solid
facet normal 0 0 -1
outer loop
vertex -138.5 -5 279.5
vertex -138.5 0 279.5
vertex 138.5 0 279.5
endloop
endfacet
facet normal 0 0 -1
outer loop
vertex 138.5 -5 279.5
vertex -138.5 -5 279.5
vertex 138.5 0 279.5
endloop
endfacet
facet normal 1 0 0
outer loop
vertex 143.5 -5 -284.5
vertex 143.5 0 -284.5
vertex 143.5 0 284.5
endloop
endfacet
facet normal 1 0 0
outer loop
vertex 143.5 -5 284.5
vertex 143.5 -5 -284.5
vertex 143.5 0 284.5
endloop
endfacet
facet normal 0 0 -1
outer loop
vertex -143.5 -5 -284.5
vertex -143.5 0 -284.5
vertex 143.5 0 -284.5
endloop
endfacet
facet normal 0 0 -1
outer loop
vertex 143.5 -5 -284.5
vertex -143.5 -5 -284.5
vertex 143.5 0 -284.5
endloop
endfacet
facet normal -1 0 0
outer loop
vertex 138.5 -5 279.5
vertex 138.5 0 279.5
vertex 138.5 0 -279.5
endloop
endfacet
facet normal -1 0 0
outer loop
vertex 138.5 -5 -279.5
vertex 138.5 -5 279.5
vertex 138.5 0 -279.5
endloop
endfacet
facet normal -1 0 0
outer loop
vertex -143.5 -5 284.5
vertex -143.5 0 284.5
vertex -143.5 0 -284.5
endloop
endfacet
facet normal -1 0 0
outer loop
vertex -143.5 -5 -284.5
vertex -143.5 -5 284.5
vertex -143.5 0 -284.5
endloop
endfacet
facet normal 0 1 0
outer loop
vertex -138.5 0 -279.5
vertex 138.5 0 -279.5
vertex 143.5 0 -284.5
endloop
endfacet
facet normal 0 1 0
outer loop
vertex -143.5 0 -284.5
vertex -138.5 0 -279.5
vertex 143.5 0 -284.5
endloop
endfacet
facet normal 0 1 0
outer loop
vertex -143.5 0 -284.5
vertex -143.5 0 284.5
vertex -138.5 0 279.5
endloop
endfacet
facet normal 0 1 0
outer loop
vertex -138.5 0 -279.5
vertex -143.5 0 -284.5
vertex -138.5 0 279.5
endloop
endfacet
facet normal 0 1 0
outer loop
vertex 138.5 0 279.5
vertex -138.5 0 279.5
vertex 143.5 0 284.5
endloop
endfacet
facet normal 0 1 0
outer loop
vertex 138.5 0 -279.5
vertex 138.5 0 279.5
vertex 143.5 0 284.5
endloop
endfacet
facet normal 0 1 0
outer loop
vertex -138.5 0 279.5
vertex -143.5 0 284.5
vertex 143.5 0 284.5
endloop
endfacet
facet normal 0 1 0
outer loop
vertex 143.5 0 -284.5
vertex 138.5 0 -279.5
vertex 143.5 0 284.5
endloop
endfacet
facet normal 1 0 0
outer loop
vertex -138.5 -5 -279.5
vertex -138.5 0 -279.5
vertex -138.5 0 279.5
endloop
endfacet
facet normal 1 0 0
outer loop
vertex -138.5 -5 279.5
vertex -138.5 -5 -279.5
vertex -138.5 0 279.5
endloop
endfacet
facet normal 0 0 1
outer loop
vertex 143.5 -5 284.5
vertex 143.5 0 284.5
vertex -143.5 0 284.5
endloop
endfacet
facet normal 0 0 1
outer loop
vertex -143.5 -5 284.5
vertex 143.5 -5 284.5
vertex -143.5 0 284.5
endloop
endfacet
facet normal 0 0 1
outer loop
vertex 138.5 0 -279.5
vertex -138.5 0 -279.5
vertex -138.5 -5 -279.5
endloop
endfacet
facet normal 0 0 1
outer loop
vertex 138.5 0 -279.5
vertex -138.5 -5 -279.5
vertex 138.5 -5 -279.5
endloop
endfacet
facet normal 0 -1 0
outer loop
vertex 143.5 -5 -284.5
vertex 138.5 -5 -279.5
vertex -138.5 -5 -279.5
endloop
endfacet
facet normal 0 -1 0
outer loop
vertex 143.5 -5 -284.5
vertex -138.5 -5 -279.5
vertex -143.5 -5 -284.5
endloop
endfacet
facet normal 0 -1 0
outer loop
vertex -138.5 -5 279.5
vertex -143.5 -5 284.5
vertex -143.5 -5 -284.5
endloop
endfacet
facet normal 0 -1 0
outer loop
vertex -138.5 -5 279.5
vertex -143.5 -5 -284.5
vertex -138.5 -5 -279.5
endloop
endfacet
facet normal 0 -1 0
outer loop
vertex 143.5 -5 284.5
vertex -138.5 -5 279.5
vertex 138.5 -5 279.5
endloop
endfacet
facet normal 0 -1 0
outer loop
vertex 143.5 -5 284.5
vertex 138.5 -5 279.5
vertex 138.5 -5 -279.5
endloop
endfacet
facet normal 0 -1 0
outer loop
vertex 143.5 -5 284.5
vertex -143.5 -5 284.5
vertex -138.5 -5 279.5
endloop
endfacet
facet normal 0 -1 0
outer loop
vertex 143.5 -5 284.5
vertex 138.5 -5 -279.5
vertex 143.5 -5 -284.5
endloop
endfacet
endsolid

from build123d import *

# Parameters (mm, degrees)
F0_W     = 277
F0_H     = 5
F1_DEPTH = 5


with BuildPart() as f1:
    # F0 (on Front) → F1 (new body)
    with BuildSketch(Plane.XZ):
        Polygon((-138.5, -279.5), (-138.5, 279.5), (-138.5, 284.5), (-143.5, 284.5), (-143.5, -284.5), (-138.5, -284.5), align=None)
        with Locations((0, 282)):
            Rectangle(F0_W, F0_H)
        Polygon((138.5, 284.5), (138.5, 279.5), (138.5, -279.5), (138.5, -284.5), (143.5, -284.5), (143.5, 284.5), align=None)
        with Locations((0, -282)):
            Rectangle(F0_W, F0_H)
    extrude(amount=F1_DEPTH)


solid = f1.part
